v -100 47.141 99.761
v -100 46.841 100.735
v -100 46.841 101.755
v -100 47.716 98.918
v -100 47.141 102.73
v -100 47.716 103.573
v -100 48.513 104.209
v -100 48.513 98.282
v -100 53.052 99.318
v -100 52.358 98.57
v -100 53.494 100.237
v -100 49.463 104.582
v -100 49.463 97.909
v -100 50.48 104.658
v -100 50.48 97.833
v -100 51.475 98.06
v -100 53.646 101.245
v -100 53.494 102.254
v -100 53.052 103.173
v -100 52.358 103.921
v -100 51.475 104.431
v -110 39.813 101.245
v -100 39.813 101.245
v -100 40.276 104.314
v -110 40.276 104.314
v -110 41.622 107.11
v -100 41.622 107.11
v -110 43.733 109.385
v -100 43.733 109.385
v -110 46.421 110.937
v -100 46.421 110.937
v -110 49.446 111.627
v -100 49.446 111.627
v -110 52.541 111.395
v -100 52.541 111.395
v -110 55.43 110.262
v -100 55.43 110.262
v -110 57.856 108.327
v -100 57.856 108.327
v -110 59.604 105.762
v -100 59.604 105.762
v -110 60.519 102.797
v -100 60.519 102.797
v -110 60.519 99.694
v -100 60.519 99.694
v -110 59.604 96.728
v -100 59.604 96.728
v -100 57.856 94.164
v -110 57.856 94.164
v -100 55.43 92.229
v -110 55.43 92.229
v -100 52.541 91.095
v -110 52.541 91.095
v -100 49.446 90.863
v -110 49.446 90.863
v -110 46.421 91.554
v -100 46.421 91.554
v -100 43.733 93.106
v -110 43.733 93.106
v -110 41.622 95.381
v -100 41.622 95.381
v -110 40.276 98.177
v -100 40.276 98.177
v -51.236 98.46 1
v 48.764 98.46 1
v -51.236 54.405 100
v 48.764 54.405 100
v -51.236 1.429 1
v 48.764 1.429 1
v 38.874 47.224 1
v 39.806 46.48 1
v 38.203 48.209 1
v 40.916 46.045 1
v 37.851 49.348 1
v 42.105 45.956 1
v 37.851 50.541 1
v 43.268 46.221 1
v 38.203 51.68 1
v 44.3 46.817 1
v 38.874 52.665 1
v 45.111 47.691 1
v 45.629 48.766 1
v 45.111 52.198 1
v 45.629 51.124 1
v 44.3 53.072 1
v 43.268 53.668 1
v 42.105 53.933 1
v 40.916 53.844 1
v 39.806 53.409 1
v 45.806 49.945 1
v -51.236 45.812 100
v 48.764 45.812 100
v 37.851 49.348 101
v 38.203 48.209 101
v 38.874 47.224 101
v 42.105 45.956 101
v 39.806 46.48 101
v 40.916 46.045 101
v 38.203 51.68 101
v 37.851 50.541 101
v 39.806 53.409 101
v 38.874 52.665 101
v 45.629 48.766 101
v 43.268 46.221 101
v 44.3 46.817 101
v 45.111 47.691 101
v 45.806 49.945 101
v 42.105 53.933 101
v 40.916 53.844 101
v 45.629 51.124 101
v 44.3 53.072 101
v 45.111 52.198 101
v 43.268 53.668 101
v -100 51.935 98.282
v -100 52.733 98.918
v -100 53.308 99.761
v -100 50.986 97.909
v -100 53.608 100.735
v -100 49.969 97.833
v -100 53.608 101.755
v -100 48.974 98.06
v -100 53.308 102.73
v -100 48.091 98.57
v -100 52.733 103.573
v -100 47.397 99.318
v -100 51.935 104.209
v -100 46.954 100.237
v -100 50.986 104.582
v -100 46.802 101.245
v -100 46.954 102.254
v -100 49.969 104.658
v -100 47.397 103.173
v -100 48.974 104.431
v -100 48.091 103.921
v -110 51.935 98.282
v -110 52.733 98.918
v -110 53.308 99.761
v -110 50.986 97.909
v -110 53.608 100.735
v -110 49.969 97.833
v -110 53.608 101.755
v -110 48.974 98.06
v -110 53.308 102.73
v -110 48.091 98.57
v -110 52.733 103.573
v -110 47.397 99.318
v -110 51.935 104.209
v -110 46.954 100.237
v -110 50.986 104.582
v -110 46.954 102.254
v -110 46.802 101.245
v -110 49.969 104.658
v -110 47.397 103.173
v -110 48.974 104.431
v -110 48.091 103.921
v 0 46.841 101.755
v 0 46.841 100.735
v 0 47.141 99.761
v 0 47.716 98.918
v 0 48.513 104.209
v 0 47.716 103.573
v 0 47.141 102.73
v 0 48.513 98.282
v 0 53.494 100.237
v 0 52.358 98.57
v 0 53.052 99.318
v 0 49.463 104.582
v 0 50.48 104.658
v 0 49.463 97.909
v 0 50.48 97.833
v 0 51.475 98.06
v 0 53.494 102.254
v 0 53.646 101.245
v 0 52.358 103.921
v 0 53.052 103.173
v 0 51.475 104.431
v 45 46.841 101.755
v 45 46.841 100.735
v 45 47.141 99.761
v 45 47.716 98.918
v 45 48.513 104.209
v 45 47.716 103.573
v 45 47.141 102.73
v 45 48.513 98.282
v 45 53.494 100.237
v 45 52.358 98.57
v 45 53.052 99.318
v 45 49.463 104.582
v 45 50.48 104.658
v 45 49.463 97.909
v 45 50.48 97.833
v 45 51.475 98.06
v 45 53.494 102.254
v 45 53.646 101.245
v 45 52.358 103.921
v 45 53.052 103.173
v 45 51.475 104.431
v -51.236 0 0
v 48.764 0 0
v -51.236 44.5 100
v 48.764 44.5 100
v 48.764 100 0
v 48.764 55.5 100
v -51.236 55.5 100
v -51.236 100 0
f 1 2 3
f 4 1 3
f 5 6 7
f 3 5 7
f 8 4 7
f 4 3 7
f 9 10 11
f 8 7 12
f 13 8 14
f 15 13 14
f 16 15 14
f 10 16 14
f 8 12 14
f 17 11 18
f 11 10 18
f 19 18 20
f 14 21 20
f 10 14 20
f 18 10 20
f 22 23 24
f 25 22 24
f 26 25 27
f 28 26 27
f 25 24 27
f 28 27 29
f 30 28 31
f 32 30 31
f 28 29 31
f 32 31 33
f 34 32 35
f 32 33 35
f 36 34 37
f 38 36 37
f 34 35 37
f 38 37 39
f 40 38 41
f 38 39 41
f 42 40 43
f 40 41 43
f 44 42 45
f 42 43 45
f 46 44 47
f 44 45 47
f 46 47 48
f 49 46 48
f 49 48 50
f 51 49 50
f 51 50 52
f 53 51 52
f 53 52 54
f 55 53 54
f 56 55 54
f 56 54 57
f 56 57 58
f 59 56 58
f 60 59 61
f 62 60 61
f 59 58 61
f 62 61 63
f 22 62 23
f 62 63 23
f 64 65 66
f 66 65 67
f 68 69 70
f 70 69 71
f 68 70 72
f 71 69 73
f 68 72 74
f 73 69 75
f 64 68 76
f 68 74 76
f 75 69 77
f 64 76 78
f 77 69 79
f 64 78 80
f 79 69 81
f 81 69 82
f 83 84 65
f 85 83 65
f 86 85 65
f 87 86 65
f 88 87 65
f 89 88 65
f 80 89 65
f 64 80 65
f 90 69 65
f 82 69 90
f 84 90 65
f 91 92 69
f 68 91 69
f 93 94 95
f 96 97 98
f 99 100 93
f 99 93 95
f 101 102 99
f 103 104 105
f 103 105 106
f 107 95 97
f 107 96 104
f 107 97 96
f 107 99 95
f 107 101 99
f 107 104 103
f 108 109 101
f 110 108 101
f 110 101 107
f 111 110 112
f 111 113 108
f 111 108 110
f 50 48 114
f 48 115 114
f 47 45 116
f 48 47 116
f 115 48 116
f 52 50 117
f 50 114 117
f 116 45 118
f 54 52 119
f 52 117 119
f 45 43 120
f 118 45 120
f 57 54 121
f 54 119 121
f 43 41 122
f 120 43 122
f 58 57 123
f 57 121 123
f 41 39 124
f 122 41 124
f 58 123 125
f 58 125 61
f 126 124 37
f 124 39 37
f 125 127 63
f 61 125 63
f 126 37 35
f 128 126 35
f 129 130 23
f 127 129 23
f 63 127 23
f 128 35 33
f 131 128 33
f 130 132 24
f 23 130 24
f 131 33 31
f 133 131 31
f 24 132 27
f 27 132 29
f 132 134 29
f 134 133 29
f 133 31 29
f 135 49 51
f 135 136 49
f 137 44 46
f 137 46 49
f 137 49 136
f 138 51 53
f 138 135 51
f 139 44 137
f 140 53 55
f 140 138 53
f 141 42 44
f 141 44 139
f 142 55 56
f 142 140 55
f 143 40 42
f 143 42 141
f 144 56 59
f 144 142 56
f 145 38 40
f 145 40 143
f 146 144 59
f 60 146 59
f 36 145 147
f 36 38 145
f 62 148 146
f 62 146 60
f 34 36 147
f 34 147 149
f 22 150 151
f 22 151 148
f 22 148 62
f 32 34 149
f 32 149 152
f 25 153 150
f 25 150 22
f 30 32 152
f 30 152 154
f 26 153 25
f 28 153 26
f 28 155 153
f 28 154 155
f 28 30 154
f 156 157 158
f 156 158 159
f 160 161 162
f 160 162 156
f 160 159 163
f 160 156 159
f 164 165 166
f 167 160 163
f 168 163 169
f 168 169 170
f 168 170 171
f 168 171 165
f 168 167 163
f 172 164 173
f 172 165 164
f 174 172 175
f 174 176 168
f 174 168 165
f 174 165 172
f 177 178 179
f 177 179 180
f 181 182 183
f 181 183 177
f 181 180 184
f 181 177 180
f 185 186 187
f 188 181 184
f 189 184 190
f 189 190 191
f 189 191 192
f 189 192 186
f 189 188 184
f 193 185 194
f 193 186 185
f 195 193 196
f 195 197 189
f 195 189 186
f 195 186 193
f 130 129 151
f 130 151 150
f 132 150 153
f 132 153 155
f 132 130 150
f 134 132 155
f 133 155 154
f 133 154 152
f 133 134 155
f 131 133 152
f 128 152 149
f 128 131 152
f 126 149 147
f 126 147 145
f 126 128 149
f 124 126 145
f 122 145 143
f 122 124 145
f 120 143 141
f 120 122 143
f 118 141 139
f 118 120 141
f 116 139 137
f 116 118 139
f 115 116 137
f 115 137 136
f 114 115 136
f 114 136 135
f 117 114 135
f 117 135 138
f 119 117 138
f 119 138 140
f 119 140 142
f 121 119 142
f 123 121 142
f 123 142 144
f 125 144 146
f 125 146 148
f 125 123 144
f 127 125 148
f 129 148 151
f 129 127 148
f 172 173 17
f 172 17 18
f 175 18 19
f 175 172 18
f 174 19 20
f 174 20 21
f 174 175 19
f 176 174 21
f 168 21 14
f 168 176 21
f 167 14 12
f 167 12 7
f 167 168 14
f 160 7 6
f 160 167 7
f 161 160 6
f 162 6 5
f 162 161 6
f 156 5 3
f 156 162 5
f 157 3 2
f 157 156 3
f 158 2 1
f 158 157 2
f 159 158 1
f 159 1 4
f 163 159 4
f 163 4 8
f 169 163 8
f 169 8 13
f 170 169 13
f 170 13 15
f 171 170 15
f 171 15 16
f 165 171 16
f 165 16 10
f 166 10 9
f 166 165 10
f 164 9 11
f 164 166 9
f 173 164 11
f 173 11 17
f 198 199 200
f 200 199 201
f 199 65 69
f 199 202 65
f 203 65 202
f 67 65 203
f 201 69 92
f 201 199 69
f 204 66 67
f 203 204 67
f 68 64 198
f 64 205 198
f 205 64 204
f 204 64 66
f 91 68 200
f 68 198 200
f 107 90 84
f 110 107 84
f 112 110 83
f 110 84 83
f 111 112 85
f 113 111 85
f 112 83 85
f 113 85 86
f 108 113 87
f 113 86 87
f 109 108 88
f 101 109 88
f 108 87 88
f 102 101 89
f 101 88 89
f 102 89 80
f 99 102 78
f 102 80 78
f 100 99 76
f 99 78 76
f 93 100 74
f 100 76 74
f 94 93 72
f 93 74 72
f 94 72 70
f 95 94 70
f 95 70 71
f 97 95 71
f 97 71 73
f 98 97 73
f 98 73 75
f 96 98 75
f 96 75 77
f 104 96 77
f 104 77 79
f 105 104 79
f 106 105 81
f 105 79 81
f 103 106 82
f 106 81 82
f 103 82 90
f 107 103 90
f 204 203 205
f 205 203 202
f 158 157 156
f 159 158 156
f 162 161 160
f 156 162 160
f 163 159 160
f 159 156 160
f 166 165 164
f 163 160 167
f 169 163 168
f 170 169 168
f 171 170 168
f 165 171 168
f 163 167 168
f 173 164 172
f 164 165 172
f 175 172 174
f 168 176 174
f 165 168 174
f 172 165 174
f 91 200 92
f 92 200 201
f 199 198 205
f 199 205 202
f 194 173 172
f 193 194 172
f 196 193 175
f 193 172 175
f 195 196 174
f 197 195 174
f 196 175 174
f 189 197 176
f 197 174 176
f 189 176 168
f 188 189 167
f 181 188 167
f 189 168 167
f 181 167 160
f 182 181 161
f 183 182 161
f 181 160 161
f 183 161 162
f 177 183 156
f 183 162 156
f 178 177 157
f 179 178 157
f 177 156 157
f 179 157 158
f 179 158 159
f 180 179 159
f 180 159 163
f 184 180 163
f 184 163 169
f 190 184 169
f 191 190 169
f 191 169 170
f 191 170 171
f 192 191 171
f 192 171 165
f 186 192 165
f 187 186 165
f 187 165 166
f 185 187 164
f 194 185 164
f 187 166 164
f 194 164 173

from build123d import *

# Parameters (mm, degrees)
F0_W      = 100
F0_H      = 100
F1_DEPTH  = 100
F3_DEPTH  = 100.001
F5_DEPTH  = 100.001
F6_R      = 4
F7_DEPTH  = 100
F8_R      = 3.422
F9_DEPTH  = 100
F9_FACE_R = 3.422
F10_DEPTH = 45
F11_R     = 10.410999
F11_R_2   = 3.422
F12_DEPTH = 10


with BuildPart() as f1:
    # F0 (on Front) → F1 (new body)
    with BuildSketch(Plane.XZ):
        with Locations((-1.236264, 50)):
            Rectangle(F0_W, F0_H)
    extrude(amount=-F1_DEPTH)

    # F2 (on face) → F3 (cut, through all)
    with BuildSketch(Plane.YZ.offset(48.763736)):
        Polygon((0, 100), (0, 0), (44.5, 100), align=None)
        Polygon((55.5, 100), (100, 0), (100, 100), align=None)
    extrude(amount=-F3_DEPTH, mode=Mode.SUBTRACT)

    # F4 (on face) → F5 (cut, through all)
    with BuildSketch(Plane.YZ.offset(48.763736)):
        Polygon((1.42873, 1), (4.827431, 1), (98.460457, 1), (54.405457, 100), (45.812438, 100), align=None)
    extrude(amount=-F5_DEPTH, mode=Mode.SUBTRACT)

    # F6 (on face) → F7 (join)
    with BuildSketch(Plane.XY.offset(1)):
        with Locations((41.806433, 49.944593)):
            Circle(F6_R)
    extrude(amount=F7_DEPTH)


with BuildPart() as f9:
    # F8 (on Right) → F9 (new body)
    with BuildSketch(Plane.YZ):
        with Locations((50.224461, 101.245329)):
            Circle(F8_R)
    extrude(amount=-F9_DEPTH)


with BuildPart() as f10:
    # F9_face (on face) → F10 (new body)
    with BuildSketch(Plane(origin=(0, 50.224461, 101.245329), x_dir=(0, 1, 0), z_dir=(1, 0, 0))):
        Circle(F9_FACE_R)
    extrude(amount=F10_DEPTH)


with BuildPart() as f12:
    # F11 (on face) → F12 (new body)
    with BuildSketch(Plane(origin=(-100, 0, 0), x_dir=(0, -1, 0), z_dir=(-1, 0, 0))):
        with Locations((-50.224461, 101.245329)):
            Circle(F11_R)
        with Locations((-50.224461, 101.245329)):
            Circle(F11_R_2, mode=Mode.SUBTRACT)
    extrude(amount=F12_DEPTH)


solid = Compound([f1.part, f9.part, f10.part, f12.part])
